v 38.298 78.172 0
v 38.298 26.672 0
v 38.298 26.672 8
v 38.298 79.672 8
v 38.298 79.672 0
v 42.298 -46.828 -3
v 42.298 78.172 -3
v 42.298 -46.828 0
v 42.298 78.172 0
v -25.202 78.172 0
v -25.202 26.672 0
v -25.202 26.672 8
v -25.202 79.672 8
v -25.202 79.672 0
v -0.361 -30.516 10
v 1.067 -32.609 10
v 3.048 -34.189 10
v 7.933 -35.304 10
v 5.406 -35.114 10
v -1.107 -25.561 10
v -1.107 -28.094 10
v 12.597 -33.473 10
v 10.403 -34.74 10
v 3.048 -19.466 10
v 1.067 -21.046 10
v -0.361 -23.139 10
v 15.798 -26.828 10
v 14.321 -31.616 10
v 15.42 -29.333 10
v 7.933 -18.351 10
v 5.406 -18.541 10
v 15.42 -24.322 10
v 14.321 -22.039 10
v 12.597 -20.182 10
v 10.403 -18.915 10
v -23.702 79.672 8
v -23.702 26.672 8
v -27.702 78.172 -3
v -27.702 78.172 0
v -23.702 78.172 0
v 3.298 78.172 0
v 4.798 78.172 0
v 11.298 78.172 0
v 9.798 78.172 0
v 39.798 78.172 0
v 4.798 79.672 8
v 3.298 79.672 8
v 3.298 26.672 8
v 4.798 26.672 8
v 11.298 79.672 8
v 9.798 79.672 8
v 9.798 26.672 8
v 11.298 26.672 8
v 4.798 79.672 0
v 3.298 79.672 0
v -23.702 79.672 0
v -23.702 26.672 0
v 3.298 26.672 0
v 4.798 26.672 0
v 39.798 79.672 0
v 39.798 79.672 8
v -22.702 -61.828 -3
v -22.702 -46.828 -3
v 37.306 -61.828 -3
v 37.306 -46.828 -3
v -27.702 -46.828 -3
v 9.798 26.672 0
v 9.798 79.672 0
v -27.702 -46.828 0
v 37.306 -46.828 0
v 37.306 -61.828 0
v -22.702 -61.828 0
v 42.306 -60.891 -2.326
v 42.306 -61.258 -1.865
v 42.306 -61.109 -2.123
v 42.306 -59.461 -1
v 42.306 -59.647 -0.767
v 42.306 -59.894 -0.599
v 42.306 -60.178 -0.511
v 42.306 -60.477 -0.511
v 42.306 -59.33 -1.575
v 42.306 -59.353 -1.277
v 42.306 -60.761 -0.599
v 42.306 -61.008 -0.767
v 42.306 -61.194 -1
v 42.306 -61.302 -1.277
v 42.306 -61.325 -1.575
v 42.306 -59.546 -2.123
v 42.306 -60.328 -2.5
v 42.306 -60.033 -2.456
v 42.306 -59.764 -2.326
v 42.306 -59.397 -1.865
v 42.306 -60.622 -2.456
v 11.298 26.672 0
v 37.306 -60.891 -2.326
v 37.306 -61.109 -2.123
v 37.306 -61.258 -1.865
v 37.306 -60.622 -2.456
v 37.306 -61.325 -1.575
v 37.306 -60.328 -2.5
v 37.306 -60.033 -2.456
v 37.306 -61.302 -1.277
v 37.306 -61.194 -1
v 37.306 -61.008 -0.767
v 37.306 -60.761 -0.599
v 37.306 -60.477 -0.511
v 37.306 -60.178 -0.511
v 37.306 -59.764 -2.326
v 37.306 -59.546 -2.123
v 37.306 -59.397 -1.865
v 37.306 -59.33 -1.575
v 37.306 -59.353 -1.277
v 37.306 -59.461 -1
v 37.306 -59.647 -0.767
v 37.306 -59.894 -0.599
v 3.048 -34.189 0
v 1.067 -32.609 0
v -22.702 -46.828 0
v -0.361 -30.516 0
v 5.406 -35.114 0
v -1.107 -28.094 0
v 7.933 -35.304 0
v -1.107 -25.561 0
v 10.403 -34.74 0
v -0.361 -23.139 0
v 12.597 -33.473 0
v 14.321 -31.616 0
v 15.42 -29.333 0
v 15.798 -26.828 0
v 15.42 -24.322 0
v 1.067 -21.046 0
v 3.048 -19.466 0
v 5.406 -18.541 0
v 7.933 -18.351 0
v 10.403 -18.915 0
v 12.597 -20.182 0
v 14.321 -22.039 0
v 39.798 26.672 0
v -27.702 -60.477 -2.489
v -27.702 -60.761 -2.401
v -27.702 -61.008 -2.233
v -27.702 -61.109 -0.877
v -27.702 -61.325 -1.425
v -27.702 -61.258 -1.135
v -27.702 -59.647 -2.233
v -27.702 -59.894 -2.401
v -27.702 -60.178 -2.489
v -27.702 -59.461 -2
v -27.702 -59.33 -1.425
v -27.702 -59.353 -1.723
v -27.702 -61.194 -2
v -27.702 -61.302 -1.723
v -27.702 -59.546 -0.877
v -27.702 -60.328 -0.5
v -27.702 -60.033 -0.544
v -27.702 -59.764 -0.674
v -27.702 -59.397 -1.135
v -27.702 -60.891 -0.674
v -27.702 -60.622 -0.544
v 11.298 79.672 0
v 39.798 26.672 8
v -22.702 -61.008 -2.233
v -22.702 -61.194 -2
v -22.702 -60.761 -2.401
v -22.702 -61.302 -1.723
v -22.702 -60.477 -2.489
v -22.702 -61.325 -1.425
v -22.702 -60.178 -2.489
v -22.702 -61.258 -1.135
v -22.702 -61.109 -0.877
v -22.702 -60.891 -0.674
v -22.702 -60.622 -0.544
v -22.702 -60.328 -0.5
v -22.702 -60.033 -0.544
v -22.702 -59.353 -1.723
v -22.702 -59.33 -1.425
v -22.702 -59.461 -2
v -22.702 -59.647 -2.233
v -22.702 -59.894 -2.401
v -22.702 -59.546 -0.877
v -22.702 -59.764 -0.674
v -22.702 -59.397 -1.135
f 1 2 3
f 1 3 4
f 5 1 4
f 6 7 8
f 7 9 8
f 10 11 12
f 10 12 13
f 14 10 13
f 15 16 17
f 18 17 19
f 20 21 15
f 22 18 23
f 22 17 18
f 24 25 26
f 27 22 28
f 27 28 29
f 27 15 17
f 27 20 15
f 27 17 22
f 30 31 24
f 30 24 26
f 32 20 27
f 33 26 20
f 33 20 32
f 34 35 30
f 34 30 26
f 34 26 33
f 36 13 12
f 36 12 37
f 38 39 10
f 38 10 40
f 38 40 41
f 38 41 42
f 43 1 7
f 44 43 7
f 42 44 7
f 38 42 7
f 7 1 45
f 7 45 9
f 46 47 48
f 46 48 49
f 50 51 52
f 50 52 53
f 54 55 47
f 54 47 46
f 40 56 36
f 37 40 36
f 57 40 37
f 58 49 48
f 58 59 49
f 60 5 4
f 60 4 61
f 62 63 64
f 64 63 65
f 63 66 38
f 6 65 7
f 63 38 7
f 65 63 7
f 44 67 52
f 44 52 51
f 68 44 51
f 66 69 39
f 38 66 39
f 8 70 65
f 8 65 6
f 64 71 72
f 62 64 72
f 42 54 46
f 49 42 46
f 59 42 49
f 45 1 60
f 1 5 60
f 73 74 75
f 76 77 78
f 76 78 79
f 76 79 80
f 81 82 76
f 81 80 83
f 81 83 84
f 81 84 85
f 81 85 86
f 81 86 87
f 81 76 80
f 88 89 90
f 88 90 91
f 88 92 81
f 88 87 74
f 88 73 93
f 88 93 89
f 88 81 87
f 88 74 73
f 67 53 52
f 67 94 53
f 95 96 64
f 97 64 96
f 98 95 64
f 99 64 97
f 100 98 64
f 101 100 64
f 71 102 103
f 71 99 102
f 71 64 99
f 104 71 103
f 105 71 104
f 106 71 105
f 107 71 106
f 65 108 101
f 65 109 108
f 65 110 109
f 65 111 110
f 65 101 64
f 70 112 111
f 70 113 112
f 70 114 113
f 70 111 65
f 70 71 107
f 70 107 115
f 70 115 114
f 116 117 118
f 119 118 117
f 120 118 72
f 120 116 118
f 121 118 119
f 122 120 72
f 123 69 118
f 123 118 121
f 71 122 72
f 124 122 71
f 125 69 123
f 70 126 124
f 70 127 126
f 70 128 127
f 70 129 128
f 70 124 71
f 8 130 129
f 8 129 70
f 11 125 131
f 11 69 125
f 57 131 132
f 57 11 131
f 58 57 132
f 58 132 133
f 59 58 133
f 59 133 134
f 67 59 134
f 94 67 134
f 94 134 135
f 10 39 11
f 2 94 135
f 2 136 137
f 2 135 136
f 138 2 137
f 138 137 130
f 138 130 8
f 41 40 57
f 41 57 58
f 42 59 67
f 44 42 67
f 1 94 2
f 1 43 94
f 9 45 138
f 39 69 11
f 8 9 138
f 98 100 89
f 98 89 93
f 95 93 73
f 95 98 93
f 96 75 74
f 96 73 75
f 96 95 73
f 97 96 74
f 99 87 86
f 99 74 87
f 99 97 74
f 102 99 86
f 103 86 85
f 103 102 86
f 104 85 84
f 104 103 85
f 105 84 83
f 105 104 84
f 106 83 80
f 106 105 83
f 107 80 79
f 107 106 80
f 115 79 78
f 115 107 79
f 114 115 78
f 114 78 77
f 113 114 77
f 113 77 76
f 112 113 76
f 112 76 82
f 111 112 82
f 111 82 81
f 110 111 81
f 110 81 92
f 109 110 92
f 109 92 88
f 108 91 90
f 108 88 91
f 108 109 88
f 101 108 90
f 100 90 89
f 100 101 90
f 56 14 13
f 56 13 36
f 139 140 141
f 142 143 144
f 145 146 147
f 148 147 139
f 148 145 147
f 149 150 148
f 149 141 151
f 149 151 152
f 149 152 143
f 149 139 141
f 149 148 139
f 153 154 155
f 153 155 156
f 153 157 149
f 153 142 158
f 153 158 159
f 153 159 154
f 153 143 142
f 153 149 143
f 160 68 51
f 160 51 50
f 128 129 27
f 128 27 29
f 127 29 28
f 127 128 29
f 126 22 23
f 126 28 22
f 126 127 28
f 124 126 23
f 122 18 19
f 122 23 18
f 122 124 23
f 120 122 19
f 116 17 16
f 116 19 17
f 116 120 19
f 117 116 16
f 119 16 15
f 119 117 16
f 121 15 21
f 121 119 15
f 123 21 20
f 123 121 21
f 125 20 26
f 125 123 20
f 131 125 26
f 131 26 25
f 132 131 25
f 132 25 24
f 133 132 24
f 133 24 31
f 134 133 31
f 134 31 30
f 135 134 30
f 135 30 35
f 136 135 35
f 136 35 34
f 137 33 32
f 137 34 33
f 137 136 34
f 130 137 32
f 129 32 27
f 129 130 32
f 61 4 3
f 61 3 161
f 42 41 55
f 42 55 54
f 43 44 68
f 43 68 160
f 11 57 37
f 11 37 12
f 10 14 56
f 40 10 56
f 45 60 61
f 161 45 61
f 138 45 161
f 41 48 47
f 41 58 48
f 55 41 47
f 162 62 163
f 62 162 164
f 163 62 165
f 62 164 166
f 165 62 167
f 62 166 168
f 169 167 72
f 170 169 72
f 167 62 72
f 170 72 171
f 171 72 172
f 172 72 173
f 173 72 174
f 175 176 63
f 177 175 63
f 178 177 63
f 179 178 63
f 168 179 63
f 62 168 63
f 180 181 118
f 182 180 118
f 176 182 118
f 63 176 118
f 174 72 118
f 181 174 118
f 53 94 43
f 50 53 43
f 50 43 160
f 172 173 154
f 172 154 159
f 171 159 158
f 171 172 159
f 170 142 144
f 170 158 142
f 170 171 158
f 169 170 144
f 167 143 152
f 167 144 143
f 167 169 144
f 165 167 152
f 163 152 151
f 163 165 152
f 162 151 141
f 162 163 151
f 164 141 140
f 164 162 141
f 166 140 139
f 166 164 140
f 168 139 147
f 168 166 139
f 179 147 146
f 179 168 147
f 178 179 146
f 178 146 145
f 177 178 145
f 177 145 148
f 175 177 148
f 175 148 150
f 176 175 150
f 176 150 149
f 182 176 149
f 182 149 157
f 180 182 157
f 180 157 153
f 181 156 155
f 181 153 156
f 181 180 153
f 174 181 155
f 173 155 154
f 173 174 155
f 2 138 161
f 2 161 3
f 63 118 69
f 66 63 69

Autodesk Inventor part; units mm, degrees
ref_plane "YZ Plane" through (0, 0, 0) normal (1, 0, 0) x (0, 1, 0)
ref_plane "XZ Plane" through (0, 0, 0) normal (0, 1, 0) x (-1, 0, 0)
ref_plane "XY Plane" through (0, 0, 0) normal (0, 0, 1) x (1, 0, 0)
sketch "Sketch1" plane through (0, 0, 0) normal (0, 0, 1) x (1, 0, 0)
  arc A0 (-17.7023, -49.8275) -> (-15.7023, -51.8275) centre (-15.7023, -49.8275) ccw projected
  line L0 (-15.7023, -51.8275) -> (30.2977, -51.8275) projected
  arc A1 (30.2977, -51.8275) -> (32.2977, -49.8275) centre (30.2977, -49.8275) ccw projected
  line L1 (32.2977, -49.8275) -> (32.2977, -3.8275) projected
  arc A2 (32.2977, -3.8275) -> (30.2977, -1.8275) centre (30.2977, -3.8275) ccw projected
  line L2 (30.2977, -1.8275) -> (-15.7023, -1.8275) projected
  arc A3 (-15.7023, -1.8275) -> (-17.7023, -3.8275) centre (-15.7023, -3.8275) ccw projected
  line L3 (-17.7023, -3.8275) -> (-17.7023, -49.8275) projected
  circle A4 centre (-15.7023, -3.8275) radius 1.5 projected
  circle A5 centre (-10.7525, -8.7773) radius 1.5 projected
  circle A6 centre (-10.7525, -44.8778) radius 1.5 projected
  circle A7 centre (-15.7023, -49.8275) radius 1.5 projected
  circle A8 centre (25.348, -44.8778) radius 1.5 projected
  circle A9 centre (30.2977, -49.8275) radius 1.5 projected
  circle A10 centre (25.348, -8.7773) radius 1.5 projected
  circle A11 centre (30.2977, -3.8275) radius 1.5 projected
  circle A12 centre (7.2977, -26.8275) radius 8.5 projected
  line L4 (-27.7023, 8.1725) -> (42.2977, 8.1725)
  line L5 (42.2977, 8.1725) -> (42.2977, -61.8275)
  line L6 (42.2977, -61.8275) -> (-27.7023, -61.8275)
  line L7 (-27.7023, -61.8275) -> (-27.7023, 8.1725)
  line L8 (-27.7023, 8.1725) -> (42.2977, -61.8275) construction
  line L9 (42.2977, 8.1725) -> (-27.7023, -61.8275) construction
  line L10 (42.2977, 8.1725) -> (-27.7023, 8.1725)
  line L11 (-27.7023, 8.1725) -> (-27.7023, 78.1725)
  line L12 (-27.7023, 78.1725) -> (42.2977, 78.1725)
  line L13 (42.2977, 78.1725) -> (42.2977, 8.1725)
  line L14 (11.2977, 68.1725) -> (38.2977, 68.1725)
  line L15 (38.2977, 68.1725) -> (38.2977, 18.1725)
  line L16 (38.2977, 18.1725) -> (11.2977, 18.1725)
  line L17 (11.2977, 18.1725) -> (11.2977, 68.1725)
  line L18 (11.2977, 68.1725) -> (38.2977, 18.1725) construction
  line L19 (38.2977, 68.1725) -> (11.2977, 18.1725) construction
  line L20 (-23.7023, 18.1725) -> (3.2977, 18.1725)
  line L21 (3.2977, 18.1725) -> (3.2977, 68.1725)
  line L22 (3.2977, 68.1725) -> (-23.7023, 68.1725)
  line L23 (-23.7023, 68.1725) -> (-23.7023, 18.1725)
  line L24 (-23.7023, 18.1725) -> (3.2977, 68.1725) construction
  line L25 (3.2977, 18.1725) -> (-23.7023, 68.1725) construction
  line L26 (4.7977, 69.6725) -> (4.7977, 16.6725)
  line L27 (-25.2023, 16.6725) -> (-25.2023, 69.6725)
  line L28 (-25.2023, 69.6725) -> (4.7977, 16.6725) construction
  line L29 (4.7977, 69.6725) -> (-25.2023, 16.6725) construction
  line L30 (39.7977, 69.6725) -> (39.7977, 16.6725)
  line L31 (9.7977, 16.6725) -> (9.7977, 69.6725)
  line L32 (9.7977, 69.6725) -> (39.7977, 16.6725) construction
  line L33 (39.7977, 69.6725) -> (9.7977, 16.6725) construction
  line L34 (38.2977, 68.1725) -> (38.2977, 69.6725)
  line L35 (11.2977, 68.1725) -> (11.2977, 69.6725)
  line L36 (11.2977, 18.1725) -> (11.2977, 16.6725)
  line L37 (38.2977, 18.1725) -> (38.2977, 16.6725)
  line L38 (3.2977, 69.6725) -> (3.2977, 68.1725)
  line L39 (3.2977, 18.1725) -> (3.2977, 16.6725)
  line L40 (-23.7023, 68.1725) -> (-23.7023, 69.6725)
  line L41 (-23.7023, 18.1725) -> (-23.7023, 16.6725)
  line L42 (-25.2023, 69.6725) -> (-23.7023, 69.6725)
  line L43 (3.2977, 69.6725) -> (4.7977, 69.6725)
  line L44 (4.7977, 16.6725) -> (3.2977, 16.6725)
  line L45 (-23.7023, 16.6725) -> (-25.2023, 16.6725)
  line L46 (39.7977, 16.6725) -> (38.2977, 16.6725)
  line L47 (11.2977, 16.6725) -> (9.7977, 16.6725)
  line L48 (9.7977, 69.6725) -> (11.2977, 69.6725)
  line L49 (38.2977, 69.6725) -> (39.7977, 69.6725)
  point P0 (0, 0)
  point P1 (24.7977, 43.1725)
  point P2 (-10.2023, 43.1725)
  dimension "d0" = 70
  dimension "d1" = 70
  dimension "d2" = 70
  dimension "d3" = 27
  dimension "d4" = 50
  dimension "d5" = 27
  dimension "d6" = 30
  dimension "d7" = 53
  dimension "d8" = 30
  dimension "d9" = 53
sketch "Sketch2" plane through (0, 0, 0) normal (0, 0, 1) x (1, 0, 0)
  arc A0 (-17.7023, -49.8275) -> (-15.7023, -51.8275) centre (-15.7023, -49.8275) ccw
  line L0 (-15.7023, -51.8275) -> (30.2977, -51.8275)
  arc A1 (30.2977, -51.8275) -> (32.2977, -49.8275) centre (30.2977, -49.8275) ccw
  line L1 (32.2977, -49.8275) -> (32.2977, -3.8275)
  arc A2 (32.2977, -3.8275) -> (30.2977, -1.8275) centre (30.2977, -3.8275) ccw
  line L2 (30.2977, -1.8275) -> (-15.7023, -1.8275)
  arc A3 (-15.7023, -1.8275) -> (-17.7023, -3.8275) centre (-15.7023, -3.8275) ccw
  line L3 (-17.7023, -3.8275) -> (-17.7023, -49.8275)
  circle A4 centre (-15.7023, -3.8275) radius 1.5
  circle A5 centre (-10.7525, -8.7773) radius 1.5
  circle A6 centre (-10.7525, -44.8778) radius 1.5
  circle A7 centre (-15.7023, -49.8275) radius 1.5
  circle A8 centre (25.348, -44.8778) radius 1.5
  circle A9 centre (30.2977, -49.8275) radius 1.5
  circle A10 centre (25.348, -8.7773) radius 1.5
  circle A11 centre (30.2977, -3.8275) radius 1.5
  circle A12 centre (7.2977, -26.8275) radius 8.5
  line L4 (-27.7023, 18.1725) -> (42.2977, 18.1725)
  line L5 (42.2977, 18.1725) -> (42.2977, -61.8275)
  line L6 (42.2977, -61.8275) -> (-27.7023, -61.8275)
  line L7 (-27.7023, -61.8275) -> (-27.7023, 18.1725)
  line L8 (42.2977, 18.1725) -> (-27.7023, 18.1725)
  line L9 (-27.7023, 18.1725) -> (-27.7023, 88.1725)
  line L10 (-27.7023, 88.1725) -> (42.2977, 88.1725)
  line L11 (42.2977, 88.1725) -> (42.2977, 18.1725)
  line L12 (11.2977, 78.1725) -> (38.2977, 78.1725)
  line L13 (38.2977, 78.1725) -> (38.2977, 28.1725)
  line L14 (38.2977, 28.1725) -> (11.2977, 28.1725)
  line L15 (11.2977, 28.1725) -> (11.2977, 78.1725)
  line L16 (11.2977, 78.1725) -> (38.2977, 28.1725) construction
  line L17 (38.2977, 78.1725) -> (11.2977, 28.1725) construction
  line L18 (-23.7023, 28.1725) -> (3.2977, 28.1725)
  line L19 (3.2977, 28.1725) -> (3.2977, 78.1725)
  line L20 (3.2977, 78.1725) -> (-23.7023, 78.1725)
  line L21 (-23.7023, 78.1725) -> (-23.7023, 28.1725)
  line L22 (-23.7023, 28.1725) -> (3.2977, 78.1725) construction
  line L23 (3.2977, 28.1725) -> (-23.7023, 78.1725) construction
  line L24 (4.7977, 79.6725) -> (4.7977, 26.6725)
  line L25 (-25.2023, 26.6725) -> (-25.2023, 79.6725)
  line L26 (-25.2023, 79.6725) -> (4.7977, 26.6725) construction
  line L27 (4.7977, 79.6725) -> (-25.2023, 26.6725) construction
  line L28 (39.7977, 79.6725) -> (39.7977, 26.6725)
  line L29 (9.7977, 26.6725) -> (9.7977, 79.6725)
  line L30 (9.7977, 79.6725) -> (39.7977, 26.6725) construction
  line L31 (39.7977, 79.6725) -> (9.7977, 26.6725) construction
  line L32 (38.2977, 78.1725) -> (38.2977, 79.6725)
  line L33 (11.2977, 78.1725) -> (11.2977, 79.6725)
  line L34 (11.2977, 28.1725) -> (11.2977, 26.6725)
  line L35 (38.2977, 28.1725) -> (38.2977, 26.6725)
  line L36 (3.2977, 79.6725) -> (3.2977, 78.1725)
  line L37 (3.2977, 28.1725) -> (3.2977, 26.6725)
  line L38 (-23.7023, 78.1725) -> (-23.7023, 79.6725)
  line L39 (-23.7023, 28.1725) -> (-23.7023, 26.6725)
  line L40 (-25.2023, 79.6725) -> (-23.7023, 79.6725)
  line L41 (3.2977, 79.6725) -> (4.7977, 79.6725)
  line L42 (4.7977, 26.6725) -> (3.2977, 26.6725)
  line L43 (-23.7023, 26.6725) -> (-25.2023, 26.6725)
  line L44 (39.7977, 26.6725) -> (38.2977, 26.6725)
  line L45 (11.2977, 26.6725) -> (9.7977, 26.6725)
  line L46 (9.7977, 79.6725) -> (11.2977, 79.6725)
  line L47 (38.2977, 79.6725) -> (39.7977, 79.6725)
  point P0 (0, 0)
  point P1 (0, 0)
  point P2 (24.7977, 53.1725)
  point P3 (-10.2023, 53.1725)
  dimension "d10" = 70
  dimension "d11" = 80
  dimension "d13" = 27
  dimension "d14" = 50
  dimension "d15" = 27
  dimension "d16" = 30
  dimension "d17" = 53
  dimension "d18" = 30
  dimension "d19" = 53
  dimension "d52" = 10
  dimension "d53" = 10
  dimension "d55" = 10
extrude "Extrusion1" add sketch "Sketch1" against normal blind 3 contours L3 A3 L2 A2 L1 A1 L0 A0 | A4 | A5 | A6 | A7 | A8 | A9 | A10 | A11 | A12 | L11 L12 L13 L4 | L4 L5 L6 L7 | L14 L15 L16 L17 | L17 L36 L47 L31 L48 L35 | L34 L49 L30 L46 L37 L15 | L23 L22 L21 L20 | L41 L45 L27 L42 L40 L23 | L21 L38 L43 L26 L44 L39
extrude "Extrusion2" add sketch "Sketch2" along normal blind 8 contours L15 L34 L45 L29 L46 L33 | L32 L47 L28 L44 L35 L13 | L39 L43 L25 L40 L38 L21 | L19 L36 L41 L24 L42 L37
sketch "Sketch3" plane through (0, 0, 0) normal (0, 0, 1) x (1, 0, 0)
  arc A0 (-17.7023, -49.8275) -> (-15.7023, -51.8275) centre (-15.7023, -49.8275) ccw
  line L0 (-15.7023, -51.8275) -> (30.2977, -51.8275)
  arc A1 (30.2977, -51.8275) -> (32.2977, -49.8275) centre (30.2977, -49.8275) ccw
  line L1 (32.2977, -49.8275) -> (32.2977, -3.8275)
  arc A2 (32.2977, -3.8275) -> (30.2977, -1.8275) centre (30.2977, -3.8275) ccw
  line L2 (30.2977, -1.8275) -> (-15.7023, -1.8275)
  arc A3 (-15.7023, -1.8275) -> (-17.7023, -3.8275) centre (-15.7023, -3.8275) ccw
  line L3 (-17.7023, -3.8275) -> (-17.7023, -49.8275)
  circle A4 centre (-15.7023, -3.8275) radius 1.5
  circle A5 centre (-10.7525, -8.7773) radius 1.5
  circle A6 centre (-10.7525, -44.8778) radius 1.5
  circle A7 centre (-15.7023, -49.8275) radius 1.5
  circle A8 centre (25.348, -44.8778) radius 1.5
  circle A9 centre (30.2977, -49.8275) radius 1.5
  circle A10 centre (25.348, -8.7773) radius 1.5
  circle A11 centre (30.2977, -3.8275) radius 1.5
  circle A12 centre (7.2977, -26.8275) radius 8.5
  line L4 (-27.7023, 8.1725) -> (42.2977, 8.1725)
  line L5 (42.2977, 8.1725) -> (42.2977, -61.8275)
  line L6 (42.2977, -61.8275) -> (-27.7023, -61.8275)
  line L7 (-27.7023, -61.8275) -> (-27.7023, 8.1725)
  line L8 (-27.7023, 8.1725) -> (42.2977, -61.8275) construction
  line L9 (42.2977, 8.1725) -> (-27.7023, -61.8275) construction
  line L10 (42.2977, 8.1725) -> (-27.7023, 8.1725)
  line L11 (-27.7023, 8.1725) -> (-27.7023, 78.1725)
  line L12 (-27.7023, 78.1725) -> (42.2977, 78.1725)
  line L13 (42.2977, 78.1725) -> (42.2977, 8.1725)
  line L14 (11.2977, 68.1725) -> (38.2977, 68.1725)
  line L15 (38.2977, 68.1725) -> (38.2977, 18.1725)
  line L16 (38.2977, 18.1725) -> (11.2977, 18.1725)
  line L17 (11.2977, 18.1725) -> (11.2977, 68.1725)
  line L18 (11.2977, 68.1725) -> (38.2977, 18.1725) construction
  line L19 (38.2977, 68.1725) -> (11.2977, 18.1725) construction
  line L20 (-23.7023, 18.1725) -> (3.2977, 18.1725)
  line L21 (3.2977, 18.1725) -> (3.2977, 68.1725)
  line L22 (3.2977, 68.1725) -> (-23.7023, 68.1725)
  line L23 (-23.7023, 68.1725) -> (-23.7023, 18.1725)
  line L24 (-23.7023, 18.1725) -> (3.2977, 68.1725) construction
  line L25 (3.2977, 18.1725) -> (-23.7023, 68.1725) construction
  line L26 (4.7977, 69.6725) -> (4.7977, 16.6725)
  line L27 (-25.2023, 16.6725) -> (-25.2023, 69.6725)
  line L28 (-25.2023, 69.6725) -> (4.7977, 16.6725) construction
  line L29 (4.7977, 69.6725) -> (-25.2023, 16.6725) construction
  line L30 (39.7977, 69.6725) -> (39.7977, 16.6725)
  line L31 (9.7977, 16.6725) -> (9.7977, 69.6725)
  line L32 (9.7977, 69.6725) -> (39.7977, 16.6725) construction
  line L33 (39.7977, 69.6725) -> (9.7977, 16.6725) construction
  line L34 (38.2977, 68.1725) -> (38.2977, 69.6725)
  line L35 (11.2977, 68.1725) -> (11.2977, 69.6725)
  line L36 (11.2977, 18.1725) -> (11.2977, 16.6725)
  line L37 (38.2977, 18.1725) -> (38.2977, 16.6725)
  line L38 (3.2977, 69.6725) -> (3.2977, 68.1725)
  line L39 (3.2977, 18.1725) -> (3.2977, 16.6725)
  line L40 (-23.7023, 68.1725) -> (-23.7023, 69.6725)
  line L41 (-23.7023, 18.1725) -> (-23.7023, 16.6725)
  line L42 (-25.2023, 69.6725) -> (-23.7023, 69.6725)
  line L43 (3.2977, 69.6725) -> (4.7977, 69.6725)
  line L44 (4.7977, 16.6725) -> (3.2977, 16.6725)
  line L45 (-23.7023, 16.6725) -> (-25.2023, 16.6725)
  line L46 (39.7977, 16.6725) -> (38.2977, 16.6725)
  line L47 (11.2977, 16.6725) -> (9.7977, 16.6725)
  line L48 (9.7977, 69.6725) -> (11.2977, 69.6725)
  line L49 (38.2977, 69.6725) -> (39.7977, 69.6725)
  point P0 (0, 0)
  point P1 (0, 0)
  point P2 (0, 0)
  point P3 (24.7977, 43.1725)
  point P4 (-10.2023, 43.1725)
  dimension "d24" = 70
  dimension "d25" = 70
  dimension "d26" = 70
  dimension "d27" = 27
  dimension "d28" = 50
  dimension "d29" = 27
  dimension "d30" = 30
  dimension "d31" = 53
  dimension "d32" = 30
  dimension "d33" = 53
extrude "Extrusion3" add sketch "Sketch3" along normal blind 10 contours A12
sketch "Sketch4" plane through (0, 0, 0) normal (0, 0, 1) x (1, 0, 0)
  line L0 (-27.7023, 78.1725) -> (-27.7023, -61.8275) projected
  line L1 (-27.7023, -61.8275) -> (-22.7023, -61.8275)
  line L2 (-22.7023, -61.8275) -> (-22.7023, -46.8275)
  line L3 (-22.7023, -46.8275) -> (-27.7023, -46.8275)
  line L4 (-27.7023, -46.8275) -> (-27.7023, -61.8275)
  line L5 (42.3055, -61.8275) -> (37.3055, -61.8275)
  line L6 (37.3055, -61.8275) -> (37.3055, -46.8275)
  line L7 (37.3055, -46.8275) -> (42.3055, -46.8275)
  line L8 (42.3055, -46.8275) -> (42.3055, -61.8275)
  point P0 (0, 0)
  dimension "d36" = 5
  dimension "d37" = 15
  dimension "d38" = 5
  dimension "d39" = 15
extrude "Extrusion4" cut sketch "Sketch4" against normal blind 3
sketch "Sketch5" plane through (-22.7023, -61.8275, 0) normal (-1, 0, 0) x (0, 0, 1)
  circle A0 centre (-1.5, 1.5) radius 1
  point P0 (0, 61.8275)
  point P1 (0, 0)
  dimension "d43" = 2
extrude "Extrusion5" add sketch "Sketch5" along normal up to surface (5 mm away)
sketch "Sketch6" plane through (37.3055, -61.8275, 0) normal (1, 0, 0) x (0, 0, -1)
  circle A0 centre (1.5, 1.5) radius 1
  point P0 (0, 61.8275)
  dimension "d46" = 2
extrude "Extrusion6" add sketch "Sketch6" along normal blind 5
properties part number "base_1"
